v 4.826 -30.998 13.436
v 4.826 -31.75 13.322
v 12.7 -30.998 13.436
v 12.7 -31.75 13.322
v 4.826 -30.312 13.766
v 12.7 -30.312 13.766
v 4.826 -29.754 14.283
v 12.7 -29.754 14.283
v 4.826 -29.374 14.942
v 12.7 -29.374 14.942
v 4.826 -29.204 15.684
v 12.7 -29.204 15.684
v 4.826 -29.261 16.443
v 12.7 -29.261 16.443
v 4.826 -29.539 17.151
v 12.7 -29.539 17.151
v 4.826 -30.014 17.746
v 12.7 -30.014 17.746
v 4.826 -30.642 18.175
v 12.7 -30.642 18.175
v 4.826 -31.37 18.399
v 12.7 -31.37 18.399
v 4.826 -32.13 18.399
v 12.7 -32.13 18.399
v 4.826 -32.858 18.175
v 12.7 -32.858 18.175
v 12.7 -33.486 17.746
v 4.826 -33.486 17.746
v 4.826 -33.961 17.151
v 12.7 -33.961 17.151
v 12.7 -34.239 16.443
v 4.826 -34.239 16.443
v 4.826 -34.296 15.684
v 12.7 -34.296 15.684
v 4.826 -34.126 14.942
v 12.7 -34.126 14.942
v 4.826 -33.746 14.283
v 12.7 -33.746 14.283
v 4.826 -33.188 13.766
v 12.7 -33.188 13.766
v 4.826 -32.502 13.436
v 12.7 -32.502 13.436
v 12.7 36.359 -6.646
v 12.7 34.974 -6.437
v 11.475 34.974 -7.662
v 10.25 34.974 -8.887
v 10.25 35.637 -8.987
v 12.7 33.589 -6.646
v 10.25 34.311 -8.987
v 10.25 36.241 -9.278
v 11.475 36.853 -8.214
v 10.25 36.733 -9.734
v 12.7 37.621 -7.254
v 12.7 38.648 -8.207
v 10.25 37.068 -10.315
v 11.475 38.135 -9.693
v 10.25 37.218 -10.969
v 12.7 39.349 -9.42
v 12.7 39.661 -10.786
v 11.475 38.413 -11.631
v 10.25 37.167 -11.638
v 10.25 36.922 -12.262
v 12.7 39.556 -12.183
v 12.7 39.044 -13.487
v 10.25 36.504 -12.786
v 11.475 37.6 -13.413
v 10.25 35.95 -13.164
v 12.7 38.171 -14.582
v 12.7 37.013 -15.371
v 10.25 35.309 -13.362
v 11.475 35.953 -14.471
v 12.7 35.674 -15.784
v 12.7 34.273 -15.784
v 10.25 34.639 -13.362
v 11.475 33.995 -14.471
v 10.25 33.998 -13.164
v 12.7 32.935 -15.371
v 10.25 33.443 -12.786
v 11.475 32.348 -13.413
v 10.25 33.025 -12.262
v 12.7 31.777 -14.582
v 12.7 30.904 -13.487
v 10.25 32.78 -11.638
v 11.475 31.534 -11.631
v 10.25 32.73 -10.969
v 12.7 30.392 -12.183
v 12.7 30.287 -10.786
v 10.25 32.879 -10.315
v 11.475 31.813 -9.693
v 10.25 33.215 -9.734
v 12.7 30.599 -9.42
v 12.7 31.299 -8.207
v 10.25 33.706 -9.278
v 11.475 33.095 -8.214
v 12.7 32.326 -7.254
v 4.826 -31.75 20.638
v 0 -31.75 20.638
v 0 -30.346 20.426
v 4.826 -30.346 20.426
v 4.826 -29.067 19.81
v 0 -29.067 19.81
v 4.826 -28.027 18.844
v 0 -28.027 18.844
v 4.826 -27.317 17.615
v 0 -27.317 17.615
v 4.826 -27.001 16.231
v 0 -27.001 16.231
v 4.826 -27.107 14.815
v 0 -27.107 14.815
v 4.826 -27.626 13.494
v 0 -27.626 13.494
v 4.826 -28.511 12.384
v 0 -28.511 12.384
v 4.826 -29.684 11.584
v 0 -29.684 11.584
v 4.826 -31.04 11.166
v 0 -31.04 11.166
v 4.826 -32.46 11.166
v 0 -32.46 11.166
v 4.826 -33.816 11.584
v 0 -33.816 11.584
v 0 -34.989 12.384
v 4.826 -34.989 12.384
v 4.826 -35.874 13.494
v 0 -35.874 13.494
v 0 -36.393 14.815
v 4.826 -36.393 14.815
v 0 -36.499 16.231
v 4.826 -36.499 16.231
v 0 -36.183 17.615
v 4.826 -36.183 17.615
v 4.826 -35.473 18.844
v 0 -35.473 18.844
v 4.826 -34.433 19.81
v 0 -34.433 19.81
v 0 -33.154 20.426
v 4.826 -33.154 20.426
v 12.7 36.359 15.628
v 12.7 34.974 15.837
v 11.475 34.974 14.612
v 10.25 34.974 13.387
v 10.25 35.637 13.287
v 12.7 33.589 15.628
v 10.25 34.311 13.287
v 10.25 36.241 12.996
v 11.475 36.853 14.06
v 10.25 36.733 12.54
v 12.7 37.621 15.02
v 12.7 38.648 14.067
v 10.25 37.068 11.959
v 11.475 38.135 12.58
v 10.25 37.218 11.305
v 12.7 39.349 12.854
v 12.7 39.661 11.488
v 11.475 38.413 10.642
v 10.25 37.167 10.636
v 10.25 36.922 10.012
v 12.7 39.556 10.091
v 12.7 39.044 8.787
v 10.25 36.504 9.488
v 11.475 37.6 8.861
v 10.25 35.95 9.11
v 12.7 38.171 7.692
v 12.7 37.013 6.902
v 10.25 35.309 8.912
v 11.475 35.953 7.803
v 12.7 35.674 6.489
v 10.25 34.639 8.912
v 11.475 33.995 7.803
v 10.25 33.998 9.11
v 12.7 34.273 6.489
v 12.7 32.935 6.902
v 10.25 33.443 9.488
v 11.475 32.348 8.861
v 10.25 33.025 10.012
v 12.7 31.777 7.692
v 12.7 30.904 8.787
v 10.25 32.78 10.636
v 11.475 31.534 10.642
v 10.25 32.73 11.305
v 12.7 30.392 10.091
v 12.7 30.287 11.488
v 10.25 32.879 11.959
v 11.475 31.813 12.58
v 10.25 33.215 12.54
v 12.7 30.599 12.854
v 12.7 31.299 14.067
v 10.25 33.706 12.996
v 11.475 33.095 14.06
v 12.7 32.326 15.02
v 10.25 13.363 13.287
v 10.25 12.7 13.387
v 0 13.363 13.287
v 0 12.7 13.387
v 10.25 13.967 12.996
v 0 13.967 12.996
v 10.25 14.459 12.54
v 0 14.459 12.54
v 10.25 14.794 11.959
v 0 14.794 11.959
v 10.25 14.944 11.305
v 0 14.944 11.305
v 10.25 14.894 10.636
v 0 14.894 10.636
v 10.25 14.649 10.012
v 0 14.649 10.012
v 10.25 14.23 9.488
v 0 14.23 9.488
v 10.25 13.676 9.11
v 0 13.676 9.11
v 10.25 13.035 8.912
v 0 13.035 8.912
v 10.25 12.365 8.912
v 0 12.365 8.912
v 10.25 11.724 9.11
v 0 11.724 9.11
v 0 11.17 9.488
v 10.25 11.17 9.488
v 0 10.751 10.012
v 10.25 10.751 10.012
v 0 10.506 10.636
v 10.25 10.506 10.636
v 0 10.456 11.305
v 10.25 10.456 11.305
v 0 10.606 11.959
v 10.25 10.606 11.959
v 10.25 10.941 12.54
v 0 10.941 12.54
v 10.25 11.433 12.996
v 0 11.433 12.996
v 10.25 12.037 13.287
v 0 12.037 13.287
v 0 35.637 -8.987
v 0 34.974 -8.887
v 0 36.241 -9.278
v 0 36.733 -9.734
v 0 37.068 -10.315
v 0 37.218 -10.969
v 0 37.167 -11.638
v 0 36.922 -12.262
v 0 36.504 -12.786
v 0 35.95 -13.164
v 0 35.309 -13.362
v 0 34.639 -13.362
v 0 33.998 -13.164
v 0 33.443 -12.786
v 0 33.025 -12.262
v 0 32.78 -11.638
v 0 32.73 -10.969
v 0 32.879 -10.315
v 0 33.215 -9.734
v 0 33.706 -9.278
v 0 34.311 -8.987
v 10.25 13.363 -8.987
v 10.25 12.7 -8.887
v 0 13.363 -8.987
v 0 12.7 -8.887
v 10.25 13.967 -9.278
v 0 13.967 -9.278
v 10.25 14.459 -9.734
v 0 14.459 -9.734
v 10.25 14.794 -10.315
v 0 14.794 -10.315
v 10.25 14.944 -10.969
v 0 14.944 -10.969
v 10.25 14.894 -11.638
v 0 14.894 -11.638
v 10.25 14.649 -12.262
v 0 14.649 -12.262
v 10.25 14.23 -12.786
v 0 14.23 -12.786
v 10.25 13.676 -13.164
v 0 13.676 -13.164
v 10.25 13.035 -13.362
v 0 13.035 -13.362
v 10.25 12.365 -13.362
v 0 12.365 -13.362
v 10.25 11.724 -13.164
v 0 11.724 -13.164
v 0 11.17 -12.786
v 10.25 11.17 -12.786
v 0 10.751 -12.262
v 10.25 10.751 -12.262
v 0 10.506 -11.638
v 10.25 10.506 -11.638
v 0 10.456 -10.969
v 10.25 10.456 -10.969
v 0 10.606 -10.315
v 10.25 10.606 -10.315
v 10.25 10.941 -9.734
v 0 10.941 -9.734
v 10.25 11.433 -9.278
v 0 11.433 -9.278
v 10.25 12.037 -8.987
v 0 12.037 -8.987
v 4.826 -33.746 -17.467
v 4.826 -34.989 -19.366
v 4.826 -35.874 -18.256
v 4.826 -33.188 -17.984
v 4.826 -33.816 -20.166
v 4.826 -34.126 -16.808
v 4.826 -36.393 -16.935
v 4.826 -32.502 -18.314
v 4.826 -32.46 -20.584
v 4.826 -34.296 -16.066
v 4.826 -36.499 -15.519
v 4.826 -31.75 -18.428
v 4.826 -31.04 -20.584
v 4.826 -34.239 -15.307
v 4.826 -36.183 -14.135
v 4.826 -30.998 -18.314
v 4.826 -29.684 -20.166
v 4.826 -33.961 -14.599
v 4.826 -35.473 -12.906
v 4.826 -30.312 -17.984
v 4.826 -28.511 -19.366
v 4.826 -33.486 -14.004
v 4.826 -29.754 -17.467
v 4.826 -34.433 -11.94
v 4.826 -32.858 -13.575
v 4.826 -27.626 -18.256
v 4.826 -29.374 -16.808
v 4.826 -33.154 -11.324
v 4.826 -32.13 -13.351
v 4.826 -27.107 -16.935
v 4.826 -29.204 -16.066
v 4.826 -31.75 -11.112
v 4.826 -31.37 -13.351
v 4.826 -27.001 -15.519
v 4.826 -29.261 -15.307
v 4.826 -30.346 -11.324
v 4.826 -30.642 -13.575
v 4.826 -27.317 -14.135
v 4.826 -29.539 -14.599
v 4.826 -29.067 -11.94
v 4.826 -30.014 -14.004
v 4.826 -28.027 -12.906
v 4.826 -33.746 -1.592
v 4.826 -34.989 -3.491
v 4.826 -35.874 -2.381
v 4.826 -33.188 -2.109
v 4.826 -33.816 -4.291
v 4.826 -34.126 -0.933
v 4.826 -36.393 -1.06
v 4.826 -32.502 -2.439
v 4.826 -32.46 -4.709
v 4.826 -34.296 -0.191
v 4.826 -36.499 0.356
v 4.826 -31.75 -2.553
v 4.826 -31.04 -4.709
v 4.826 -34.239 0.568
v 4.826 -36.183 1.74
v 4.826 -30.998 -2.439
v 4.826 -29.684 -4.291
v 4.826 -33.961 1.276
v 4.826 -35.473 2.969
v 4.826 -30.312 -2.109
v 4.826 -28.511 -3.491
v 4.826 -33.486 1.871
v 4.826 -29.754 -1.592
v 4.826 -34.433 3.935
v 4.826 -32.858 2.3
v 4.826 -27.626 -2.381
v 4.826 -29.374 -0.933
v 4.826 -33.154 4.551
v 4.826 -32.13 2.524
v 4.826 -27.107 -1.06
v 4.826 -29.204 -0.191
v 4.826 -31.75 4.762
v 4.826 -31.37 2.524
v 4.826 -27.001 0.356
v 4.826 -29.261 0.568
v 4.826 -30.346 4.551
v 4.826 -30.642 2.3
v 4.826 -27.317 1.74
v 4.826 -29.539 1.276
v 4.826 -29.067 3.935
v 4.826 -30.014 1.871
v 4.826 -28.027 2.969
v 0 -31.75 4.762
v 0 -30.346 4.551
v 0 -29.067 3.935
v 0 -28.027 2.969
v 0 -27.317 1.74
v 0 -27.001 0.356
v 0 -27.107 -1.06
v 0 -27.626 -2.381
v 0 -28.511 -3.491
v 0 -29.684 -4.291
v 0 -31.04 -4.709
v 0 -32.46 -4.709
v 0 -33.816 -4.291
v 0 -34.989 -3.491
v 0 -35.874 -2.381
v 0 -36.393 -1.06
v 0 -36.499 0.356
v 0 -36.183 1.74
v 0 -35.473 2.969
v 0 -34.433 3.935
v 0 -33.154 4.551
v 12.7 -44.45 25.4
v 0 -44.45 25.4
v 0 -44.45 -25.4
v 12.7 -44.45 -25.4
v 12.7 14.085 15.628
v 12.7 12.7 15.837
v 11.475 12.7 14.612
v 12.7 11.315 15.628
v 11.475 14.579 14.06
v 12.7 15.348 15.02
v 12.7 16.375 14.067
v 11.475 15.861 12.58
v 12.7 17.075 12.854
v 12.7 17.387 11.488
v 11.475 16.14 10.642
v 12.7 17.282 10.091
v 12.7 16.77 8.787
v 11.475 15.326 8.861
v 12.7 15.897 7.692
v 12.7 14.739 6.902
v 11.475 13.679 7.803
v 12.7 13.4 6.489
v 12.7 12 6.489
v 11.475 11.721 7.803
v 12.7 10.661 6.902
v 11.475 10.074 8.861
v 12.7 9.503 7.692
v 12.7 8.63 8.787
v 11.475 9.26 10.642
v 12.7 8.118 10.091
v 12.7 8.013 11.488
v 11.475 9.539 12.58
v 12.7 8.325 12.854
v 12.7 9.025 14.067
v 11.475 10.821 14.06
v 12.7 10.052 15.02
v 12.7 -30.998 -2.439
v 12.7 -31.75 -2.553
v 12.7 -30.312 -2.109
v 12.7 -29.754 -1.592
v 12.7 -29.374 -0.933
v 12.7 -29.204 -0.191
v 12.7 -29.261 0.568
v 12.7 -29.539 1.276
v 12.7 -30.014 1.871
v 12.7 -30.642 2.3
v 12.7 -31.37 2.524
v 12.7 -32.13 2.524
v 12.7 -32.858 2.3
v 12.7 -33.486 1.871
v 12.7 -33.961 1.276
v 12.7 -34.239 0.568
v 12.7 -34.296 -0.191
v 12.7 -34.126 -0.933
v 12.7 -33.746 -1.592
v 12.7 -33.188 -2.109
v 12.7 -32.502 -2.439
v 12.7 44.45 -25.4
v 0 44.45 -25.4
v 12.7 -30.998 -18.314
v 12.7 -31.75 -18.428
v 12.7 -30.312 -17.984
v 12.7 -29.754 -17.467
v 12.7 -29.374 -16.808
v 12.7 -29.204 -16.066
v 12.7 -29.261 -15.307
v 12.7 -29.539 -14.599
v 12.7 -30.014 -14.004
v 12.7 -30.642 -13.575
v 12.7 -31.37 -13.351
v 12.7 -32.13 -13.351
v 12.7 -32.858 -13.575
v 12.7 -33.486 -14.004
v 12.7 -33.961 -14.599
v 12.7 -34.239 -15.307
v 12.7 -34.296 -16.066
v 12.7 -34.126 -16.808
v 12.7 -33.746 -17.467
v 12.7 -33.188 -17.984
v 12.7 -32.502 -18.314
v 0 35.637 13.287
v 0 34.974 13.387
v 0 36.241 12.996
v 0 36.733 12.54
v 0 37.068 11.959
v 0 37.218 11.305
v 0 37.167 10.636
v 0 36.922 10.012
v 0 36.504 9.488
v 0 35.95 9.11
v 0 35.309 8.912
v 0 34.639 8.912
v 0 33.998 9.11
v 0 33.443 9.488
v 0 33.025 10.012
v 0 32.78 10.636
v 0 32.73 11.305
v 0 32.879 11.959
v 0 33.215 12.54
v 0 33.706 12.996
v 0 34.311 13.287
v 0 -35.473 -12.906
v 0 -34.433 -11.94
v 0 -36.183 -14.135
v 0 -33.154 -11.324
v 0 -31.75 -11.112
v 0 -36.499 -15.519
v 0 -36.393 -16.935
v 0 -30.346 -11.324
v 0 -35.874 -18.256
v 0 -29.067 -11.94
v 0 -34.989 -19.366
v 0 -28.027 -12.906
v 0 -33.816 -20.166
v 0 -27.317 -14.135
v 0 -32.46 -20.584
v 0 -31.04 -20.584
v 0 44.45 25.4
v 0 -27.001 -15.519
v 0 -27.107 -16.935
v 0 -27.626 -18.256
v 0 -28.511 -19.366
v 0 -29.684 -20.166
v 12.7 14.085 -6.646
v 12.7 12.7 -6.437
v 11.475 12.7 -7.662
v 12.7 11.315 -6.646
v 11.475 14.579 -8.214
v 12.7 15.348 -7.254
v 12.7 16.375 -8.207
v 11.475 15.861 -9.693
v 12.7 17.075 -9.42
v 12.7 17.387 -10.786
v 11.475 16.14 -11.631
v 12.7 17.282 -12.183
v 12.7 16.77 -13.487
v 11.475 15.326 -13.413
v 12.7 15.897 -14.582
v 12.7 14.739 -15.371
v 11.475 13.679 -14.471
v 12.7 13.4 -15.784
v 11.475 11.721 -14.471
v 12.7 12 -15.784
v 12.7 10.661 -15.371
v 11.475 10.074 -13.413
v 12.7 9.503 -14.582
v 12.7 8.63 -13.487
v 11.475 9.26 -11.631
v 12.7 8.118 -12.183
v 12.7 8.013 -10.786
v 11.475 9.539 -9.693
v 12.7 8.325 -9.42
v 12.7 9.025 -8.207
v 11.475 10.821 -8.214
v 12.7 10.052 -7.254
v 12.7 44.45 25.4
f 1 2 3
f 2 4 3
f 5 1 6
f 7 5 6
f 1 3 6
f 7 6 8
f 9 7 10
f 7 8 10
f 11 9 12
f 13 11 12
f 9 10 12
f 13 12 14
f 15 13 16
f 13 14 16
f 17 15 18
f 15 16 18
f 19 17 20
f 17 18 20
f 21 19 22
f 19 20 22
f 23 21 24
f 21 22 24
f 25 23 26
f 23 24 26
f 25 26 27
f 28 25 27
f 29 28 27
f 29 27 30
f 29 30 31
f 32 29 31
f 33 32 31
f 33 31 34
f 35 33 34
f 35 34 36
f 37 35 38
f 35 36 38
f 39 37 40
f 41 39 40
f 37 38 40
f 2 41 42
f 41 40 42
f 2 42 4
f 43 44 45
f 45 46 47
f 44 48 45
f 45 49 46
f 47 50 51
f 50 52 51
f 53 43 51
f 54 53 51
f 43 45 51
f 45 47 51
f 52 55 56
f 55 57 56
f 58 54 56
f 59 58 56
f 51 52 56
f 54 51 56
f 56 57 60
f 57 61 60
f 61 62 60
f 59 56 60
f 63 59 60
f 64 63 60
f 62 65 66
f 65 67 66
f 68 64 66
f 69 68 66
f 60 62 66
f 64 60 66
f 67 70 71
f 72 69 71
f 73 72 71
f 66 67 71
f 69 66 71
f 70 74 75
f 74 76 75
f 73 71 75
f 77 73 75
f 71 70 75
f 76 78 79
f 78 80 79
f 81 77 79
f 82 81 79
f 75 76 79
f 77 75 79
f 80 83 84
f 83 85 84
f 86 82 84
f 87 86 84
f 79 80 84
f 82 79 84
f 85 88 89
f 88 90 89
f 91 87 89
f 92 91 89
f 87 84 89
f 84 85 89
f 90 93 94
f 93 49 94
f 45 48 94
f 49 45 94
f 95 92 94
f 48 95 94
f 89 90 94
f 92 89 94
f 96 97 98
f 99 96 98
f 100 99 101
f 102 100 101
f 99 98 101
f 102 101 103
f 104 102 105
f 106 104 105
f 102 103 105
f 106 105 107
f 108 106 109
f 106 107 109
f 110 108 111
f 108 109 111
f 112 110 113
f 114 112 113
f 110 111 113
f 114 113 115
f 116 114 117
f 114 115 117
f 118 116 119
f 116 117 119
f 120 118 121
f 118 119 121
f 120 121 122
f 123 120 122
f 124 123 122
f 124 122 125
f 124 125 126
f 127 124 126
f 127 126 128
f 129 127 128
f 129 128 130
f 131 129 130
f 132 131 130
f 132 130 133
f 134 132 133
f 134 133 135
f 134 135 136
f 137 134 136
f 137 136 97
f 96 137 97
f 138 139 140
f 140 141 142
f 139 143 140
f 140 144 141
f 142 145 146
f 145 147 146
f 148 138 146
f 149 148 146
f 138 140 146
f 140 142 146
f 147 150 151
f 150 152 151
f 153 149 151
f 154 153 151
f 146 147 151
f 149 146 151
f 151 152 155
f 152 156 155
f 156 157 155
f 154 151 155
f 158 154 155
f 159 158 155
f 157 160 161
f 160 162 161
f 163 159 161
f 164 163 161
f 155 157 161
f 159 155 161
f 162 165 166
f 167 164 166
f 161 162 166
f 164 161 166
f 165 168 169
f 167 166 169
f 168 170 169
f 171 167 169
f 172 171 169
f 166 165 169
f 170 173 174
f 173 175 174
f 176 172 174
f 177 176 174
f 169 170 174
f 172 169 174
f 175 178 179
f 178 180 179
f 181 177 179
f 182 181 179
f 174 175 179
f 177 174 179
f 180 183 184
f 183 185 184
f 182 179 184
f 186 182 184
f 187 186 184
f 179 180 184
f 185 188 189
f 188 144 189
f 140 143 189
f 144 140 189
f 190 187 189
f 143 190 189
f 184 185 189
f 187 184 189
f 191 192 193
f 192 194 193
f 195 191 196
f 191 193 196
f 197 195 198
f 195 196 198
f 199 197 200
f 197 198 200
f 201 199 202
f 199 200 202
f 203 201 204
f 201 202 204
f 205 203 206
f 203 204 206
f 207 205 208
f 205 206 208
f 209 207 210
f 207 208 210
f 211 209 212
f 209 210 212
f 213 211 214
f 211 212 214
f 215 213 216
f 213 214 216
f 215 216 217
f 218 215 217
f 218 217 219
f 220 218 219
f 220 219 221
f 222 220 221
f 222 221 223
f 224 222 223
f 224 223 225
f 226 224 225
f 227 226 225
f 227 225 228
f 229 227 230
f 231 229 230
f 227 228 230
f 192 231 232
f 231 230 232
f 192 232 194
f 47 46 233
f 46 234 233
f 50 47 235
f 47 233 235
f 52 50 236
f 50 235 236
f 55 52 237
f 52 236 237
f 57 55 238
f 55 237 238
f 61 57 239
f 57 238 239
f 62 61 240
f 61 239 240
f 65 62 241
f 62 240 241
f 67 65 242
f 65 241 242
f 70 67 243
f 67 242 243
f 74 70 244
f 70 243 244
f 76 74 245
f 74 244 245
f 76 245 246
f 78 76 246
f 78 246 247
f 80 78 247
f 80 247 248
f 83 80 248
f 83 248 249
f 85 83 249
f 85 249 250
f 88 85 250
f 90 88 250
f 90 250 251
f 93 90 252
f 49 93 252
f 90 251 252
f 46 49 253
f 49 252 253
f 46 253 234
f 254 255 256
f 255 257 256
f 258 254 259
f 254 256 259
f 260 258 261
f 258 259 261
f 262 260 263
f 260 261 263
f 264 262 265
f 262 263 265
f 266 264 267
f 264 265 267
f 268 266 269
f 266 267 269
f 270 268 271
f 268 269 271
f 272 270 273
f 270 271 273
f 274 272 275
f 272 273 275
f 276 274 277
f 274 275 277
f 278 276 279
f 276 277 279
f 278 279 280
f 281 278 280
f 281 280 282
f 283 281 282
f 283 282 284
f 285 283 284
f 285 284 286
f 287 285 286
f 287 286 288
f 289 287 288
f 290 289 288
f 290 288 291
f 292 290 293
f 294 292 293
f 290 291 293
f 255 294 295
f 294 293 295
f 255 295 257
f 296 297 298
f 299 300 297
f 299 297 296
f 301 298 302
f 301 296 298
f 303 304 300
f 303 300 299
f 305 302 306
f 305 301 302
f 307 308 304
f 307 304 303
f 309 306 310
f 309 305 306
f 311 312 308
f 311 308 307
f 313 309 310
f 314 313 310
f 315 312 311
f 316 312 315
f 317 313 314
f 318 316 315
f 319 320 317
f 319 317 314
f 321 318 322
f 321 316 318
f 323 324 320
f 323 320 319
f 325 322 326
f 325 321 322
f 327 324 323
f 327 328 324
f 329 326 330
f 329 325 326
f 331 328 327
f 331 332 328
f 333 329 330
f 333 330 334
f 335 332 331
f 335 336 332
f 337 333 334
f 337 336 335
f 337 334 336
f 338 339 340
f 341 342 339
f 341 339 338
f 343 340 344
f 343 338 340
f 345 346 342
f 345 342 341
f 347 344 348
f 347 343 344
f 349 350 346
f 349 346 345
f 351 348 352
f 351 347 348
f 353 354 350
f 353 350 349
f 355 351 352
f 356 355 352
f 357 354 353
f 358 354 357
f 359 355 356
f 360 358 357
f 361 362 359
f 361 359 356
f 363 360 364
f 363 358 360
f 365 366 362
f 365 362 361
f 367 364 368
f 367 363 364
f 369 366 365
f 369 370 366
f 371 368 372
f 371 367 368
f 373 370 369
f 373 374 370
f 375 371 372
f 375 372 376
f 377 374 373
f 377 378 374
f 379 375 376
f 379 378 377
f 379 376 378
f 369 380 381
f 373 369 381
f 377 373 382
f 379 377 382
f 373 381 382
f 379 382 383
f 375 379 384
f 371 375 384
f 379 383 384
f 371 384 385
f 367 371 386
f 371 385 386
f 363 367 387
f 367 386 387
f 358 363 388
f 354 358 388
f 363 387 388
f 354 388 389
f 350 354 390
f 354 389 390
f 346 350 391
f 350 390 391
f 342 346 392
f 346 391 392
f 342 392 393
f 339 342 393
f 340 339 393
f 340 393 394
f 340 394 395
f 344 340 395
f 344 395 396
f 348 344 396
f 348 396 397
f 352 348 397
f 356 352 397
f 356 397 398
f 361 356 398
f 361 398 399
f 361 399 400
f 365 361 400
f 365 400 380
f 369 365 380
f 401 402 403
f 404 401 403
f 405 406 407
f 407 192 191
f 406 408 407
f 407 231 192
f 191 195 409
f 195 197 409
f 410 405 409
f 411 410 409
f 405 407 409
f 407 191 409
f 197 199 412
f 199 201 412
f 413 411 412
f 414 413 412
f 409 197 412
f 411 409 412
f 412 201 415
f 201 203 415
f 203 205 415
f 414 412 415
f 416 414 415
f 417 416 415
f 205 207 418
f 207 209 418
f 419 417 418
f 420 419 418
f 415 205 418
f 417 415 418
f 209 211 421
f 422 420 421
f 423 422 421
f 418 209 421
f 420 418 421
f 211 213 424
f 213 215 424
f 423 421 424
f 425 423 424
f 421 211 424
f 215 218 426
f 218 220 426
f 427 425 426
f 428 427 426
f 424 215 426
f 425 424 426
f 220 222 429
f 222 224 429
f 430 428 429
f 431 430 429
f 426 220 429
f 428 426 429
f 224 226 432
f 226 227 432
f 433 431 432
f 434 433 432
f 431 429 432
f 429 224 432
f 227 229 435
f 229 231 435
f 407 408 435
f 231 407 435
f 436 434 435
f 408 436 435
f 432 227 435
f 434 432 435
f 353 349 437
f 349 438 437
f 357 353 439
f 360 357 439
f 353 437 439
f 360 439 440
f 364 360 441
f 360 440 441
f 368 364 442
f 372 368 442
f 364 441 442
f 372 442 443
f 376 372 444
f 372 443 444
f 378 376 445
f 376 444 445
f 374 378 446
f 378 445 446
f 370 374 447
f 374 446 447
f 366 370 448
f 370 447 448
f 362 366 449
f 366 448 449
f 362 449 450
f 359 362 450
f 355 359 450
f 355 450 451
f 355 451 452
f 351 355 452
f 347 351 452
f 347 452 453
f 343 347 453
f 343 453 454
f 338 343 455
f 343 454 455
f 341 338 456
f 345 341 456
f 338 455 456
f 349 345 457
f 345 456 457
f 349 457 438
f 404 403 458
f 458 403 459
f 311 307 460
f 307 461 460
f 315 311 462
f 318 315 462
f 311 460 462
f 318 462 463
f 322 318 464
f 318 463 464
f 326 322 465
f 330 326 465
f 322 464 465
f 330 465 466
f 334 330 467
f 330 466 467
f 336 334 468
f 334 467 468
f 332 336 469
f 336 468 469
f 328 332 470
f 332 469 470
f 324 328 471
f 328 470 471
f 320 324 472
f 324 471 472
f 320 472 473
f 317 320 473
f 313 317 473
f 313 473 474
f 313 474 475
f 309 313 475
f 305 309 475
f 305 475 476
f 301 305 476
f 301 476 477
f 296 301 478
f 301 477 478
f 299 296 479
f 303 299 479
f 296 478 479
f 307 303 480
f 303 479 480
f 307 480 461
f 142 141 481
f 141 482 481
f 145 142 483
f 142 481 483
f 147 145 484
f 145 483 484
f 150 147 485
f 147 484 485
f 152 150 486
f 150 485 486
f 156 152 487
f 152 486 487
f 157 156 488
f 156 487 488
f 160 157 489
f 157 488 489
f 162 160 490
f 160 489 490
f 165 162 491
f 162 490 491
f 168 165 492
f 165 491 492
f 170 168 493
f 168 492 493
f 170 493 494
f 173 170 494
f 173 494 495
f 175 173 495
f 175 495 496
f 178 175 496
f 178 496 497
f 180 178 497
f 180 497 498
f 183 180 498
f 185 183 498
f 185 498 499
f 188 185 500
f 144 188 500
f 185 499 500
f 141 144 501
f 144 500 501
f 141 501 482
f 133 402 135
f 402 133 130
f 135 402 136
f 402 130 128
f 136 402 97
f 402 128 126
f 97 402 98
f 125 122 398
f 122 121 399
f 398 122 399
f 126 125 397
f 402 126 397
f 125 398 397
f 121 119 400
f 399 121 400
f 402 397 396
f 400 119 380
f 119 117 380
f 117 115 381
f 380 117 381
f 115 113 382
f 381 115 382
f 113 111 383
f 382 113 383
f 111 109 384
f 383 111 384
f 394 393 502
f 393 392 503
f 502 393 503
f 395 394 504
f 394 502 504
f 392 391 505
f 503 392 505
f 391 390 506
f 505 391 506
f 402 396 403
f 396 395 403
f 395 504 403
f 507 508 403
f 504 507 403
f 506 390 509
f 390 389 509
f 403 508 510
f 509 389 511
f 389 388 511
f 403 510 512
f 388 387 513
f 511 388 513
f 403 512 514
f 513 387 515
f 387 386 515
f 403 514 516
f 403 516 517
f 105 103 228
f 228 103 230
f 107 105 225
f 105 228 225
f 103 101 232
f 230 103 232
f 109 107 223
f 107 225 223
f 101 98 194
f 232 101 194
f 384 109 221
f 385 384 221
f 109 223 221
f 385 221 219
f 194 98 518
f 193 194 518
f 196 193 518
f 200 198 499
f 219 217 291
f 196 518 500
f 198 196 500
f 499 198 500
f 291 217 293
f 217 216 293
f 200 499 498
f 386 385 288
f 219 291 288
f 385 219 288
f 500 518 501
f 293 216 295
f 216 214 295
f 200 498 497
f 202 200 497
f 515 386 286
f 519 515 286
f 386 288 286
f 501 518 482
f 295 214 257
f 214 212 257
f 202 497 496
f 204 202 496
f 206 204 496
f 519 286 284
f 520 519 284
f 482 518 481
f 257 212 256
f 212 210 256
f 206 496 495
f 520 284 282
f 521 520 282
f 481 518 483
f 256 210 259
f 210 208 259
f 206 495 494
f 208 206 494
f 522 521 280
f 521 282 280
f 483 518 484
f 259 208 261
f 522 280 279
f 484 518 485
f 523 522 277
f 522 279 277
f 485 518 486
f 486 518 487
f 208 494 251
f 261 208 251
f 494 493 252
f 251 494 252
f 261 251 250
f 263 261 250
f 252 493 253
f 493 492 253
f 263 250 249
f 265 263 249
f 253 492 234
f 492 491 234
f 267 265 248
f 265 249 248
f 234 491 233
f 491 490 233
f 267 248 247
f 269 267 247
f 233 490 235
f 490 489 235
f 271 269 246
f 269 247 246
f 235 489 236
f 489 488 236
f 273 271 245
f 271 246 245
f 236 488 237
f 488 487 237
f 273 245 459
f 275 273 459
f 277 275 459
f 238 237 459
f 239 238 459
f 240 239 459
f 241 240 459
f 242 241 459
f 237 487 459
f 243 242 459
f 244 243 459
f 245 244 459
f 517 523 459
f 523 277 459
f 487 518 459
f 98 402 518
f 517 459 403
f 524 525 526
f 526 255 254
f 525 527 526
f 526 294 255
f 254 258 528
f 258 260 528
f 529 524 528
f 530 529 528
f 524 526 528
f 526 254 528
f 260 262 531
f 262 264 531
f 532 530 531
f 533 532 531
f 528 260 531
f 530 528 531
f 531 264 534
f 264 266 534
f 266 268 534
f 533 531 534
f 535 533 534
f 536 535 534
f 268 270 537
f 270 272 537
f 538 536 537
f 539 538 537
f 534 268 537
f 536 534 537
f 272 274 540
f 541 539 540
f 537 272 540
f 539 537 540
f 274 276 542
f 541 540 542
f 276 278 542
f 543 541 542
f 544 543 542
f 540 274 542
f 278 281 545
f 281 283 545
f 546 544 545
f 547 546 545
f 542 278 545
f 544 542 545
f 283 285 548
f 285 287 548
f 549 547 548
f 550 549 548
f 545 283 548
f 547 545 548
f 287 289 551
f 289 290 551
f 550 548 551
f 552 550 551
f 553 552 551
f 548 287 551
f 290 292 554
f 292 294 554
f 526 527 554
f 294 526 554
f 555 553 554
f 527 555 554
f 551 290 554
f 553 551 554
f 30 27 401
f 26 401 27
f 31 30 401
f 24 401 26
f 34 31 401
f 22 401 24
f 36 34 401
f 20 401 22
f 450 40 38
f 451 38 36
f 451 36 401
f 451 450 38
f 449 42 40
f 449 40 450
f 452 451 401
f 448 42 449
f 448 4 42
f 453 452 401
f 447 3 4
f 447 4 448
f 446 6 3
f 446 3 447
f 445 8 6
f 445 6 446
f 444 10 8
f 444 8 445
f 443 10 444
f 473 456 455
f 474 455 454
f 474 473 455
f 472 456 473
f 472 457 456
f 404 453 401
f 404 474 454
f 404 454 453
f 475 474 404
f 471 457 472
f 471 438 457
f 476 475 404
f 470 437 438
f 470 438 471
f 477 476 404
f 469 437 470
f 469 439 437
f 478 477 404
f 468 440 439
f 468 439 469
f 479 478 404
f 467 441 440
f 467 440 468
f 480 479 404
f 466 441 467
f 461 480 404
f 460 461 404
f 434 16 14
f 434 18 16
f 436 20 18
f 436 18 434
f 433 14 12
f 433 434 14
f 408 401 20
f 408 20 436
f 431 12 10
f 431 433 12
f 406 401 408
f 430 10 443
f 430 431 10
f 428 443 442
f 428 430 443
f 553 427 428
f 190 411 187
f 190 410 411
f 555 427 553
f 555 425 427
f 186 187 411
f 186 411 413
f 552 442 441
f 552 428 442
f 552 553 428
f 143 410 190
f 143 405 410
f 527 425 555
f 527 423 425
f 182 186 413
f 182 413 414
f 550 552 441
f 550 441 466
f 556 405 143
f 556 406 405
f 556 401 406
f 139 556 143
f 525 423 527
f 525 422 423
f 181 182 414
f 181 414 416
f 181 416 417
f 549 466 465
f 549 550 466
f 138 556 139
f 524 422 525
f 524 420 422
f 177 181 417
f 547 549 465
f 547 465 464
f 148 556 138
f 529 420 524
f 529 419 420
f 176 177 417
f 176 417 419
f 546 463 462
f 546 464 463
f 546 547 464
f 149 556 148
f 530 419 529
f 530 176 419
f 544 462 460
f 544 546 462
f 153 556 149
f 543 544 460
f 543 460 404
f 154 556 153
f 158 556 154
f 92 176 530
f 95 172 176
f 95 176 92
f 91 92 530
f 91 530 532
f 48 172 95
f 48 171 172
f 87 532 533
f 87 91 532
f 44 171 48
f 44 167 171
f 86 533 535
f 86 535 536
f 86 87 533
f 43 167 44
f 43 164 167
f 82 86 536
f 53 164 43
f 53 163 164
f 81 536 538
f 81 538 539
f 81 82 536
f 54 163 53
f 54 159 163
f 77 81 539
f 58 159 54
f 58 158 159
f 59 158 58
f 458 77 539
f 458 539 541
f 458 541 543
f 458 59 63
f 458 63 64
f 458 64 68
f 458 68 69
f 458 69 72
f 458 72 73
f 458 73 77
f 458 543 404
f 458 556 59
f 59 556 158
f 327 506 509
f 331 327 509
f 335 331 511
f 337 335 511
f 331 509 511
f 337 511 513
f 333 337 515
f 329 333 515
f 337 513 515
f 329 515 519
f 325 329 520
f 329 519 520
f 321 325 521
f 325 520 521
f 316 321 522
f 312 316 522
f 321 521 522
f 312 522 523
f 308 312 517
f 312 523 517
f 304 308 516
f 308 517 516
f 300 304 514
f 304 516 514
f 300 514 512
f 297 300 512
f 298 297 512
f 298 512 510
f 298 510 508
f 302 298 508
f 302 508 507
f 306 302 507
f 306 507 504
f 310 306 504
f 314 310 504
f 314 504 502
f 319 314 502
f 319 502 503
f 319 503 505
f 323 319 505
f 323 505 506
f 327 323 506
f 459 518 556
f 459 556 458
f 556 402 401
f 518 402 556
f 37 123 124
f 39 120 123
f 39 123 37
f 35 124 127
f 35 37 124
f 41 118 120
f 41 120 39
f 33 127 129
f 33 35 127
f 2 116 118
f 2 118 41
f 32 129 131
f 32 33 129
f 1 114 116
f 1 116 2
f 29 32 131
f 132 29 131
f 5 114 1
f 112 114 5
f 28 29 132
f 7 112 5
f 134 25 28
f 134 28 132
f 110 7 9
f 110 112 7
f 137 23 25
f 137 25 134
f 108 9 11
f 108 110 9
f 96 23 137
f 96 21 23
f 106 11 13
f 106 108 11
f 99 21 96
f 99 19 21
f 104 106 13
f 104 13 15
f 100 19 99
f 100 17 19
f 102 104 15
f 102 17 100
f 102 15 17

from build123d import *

# Parameters (mm, degrees)
SKETCH1_W                                       = 50.8
SKETCH1_H                                       = 88.9
BOSS_EXTRUDE1_DEPTH                             = 12.7
CSK_FOR_M4_FLAT_HEAD_MACHINE_SCREW1_D           = 4.5
CSK_FOR_M4_FLAT_HEAD_MACHINE_SCREW1_CSINK_D     = 9.4
CSK_FOR_M4_FLAT_HEAD_MACHINE_SCREW1_CSINK_ANGLE = 90
CBORE_FOR_10_SOCKET_HEAD_CAP_SCREW1_D           = 5.1054
CBORE_FOR_10_SOCKET_HEAD_CAP_SCREW1_CBORE_D     = 9.525
CBORE_FOR_10_SOCKET_HEAD_CAP_SCREW1_CBORE_DEPTH = 4.826


with BuildPart() as part:
    # Sketch1 → Boss-Extrude1 (new body)
    with BuildSketch(Plane(origin=(0, 0, 0), x_dir=(0, 0, -1), z_dir=(1, 0, 0))):
        Rectangle(SKETCH1_W, SKETCH1_H)
    extrude(amount=BOSS_EXTRUDE1_DEPTH)

    # CSK for M4 Flat Head Machine Screw1 (through all)
    with Locations(Plane(origin=(12.7, 0, 0), x_dir=(0, 0, -1), z_dir=(1, 0, 0))):
        with Locations((11.136931804, 34.973863607), (-11.136931804, 34.973863607), (-11.136931804, 12.7), (11.136931804, 12.7)):
            CounterSinkHole(CSK_FOR_M4_FLAT_HEAD_MACHINE_SCREW1_D / 2, CSK_FOR_M4_FLAT_HEAD_MACHINE_SCREW1_CSINK_D / 2, counter_sink_angle=CSK_FOR_M4_FLAT_HEAD_MACHINE_SCREW1_CSINK_ANGLE)

    # CBORE for #10 Socket Head Cap Screw1 (through all)
    with Locations(Plane.ZY):
        with Locations((-15.875, -31.75), (0, -31.75), (15.875, -31.75)):
            CounterBoreHole(CBORE_FOR_10_SOCKET_HEAD_CAP_SCREW1_D / 2, CBORE_FOR_10_SOCKET_HEAD_CAP_SCREW1_CBORE_D / 2, CBORE_FOR_10_SOCKET_HEAD_CAP_SCREW1_CBORE_DEPTH)


solid = part.part
